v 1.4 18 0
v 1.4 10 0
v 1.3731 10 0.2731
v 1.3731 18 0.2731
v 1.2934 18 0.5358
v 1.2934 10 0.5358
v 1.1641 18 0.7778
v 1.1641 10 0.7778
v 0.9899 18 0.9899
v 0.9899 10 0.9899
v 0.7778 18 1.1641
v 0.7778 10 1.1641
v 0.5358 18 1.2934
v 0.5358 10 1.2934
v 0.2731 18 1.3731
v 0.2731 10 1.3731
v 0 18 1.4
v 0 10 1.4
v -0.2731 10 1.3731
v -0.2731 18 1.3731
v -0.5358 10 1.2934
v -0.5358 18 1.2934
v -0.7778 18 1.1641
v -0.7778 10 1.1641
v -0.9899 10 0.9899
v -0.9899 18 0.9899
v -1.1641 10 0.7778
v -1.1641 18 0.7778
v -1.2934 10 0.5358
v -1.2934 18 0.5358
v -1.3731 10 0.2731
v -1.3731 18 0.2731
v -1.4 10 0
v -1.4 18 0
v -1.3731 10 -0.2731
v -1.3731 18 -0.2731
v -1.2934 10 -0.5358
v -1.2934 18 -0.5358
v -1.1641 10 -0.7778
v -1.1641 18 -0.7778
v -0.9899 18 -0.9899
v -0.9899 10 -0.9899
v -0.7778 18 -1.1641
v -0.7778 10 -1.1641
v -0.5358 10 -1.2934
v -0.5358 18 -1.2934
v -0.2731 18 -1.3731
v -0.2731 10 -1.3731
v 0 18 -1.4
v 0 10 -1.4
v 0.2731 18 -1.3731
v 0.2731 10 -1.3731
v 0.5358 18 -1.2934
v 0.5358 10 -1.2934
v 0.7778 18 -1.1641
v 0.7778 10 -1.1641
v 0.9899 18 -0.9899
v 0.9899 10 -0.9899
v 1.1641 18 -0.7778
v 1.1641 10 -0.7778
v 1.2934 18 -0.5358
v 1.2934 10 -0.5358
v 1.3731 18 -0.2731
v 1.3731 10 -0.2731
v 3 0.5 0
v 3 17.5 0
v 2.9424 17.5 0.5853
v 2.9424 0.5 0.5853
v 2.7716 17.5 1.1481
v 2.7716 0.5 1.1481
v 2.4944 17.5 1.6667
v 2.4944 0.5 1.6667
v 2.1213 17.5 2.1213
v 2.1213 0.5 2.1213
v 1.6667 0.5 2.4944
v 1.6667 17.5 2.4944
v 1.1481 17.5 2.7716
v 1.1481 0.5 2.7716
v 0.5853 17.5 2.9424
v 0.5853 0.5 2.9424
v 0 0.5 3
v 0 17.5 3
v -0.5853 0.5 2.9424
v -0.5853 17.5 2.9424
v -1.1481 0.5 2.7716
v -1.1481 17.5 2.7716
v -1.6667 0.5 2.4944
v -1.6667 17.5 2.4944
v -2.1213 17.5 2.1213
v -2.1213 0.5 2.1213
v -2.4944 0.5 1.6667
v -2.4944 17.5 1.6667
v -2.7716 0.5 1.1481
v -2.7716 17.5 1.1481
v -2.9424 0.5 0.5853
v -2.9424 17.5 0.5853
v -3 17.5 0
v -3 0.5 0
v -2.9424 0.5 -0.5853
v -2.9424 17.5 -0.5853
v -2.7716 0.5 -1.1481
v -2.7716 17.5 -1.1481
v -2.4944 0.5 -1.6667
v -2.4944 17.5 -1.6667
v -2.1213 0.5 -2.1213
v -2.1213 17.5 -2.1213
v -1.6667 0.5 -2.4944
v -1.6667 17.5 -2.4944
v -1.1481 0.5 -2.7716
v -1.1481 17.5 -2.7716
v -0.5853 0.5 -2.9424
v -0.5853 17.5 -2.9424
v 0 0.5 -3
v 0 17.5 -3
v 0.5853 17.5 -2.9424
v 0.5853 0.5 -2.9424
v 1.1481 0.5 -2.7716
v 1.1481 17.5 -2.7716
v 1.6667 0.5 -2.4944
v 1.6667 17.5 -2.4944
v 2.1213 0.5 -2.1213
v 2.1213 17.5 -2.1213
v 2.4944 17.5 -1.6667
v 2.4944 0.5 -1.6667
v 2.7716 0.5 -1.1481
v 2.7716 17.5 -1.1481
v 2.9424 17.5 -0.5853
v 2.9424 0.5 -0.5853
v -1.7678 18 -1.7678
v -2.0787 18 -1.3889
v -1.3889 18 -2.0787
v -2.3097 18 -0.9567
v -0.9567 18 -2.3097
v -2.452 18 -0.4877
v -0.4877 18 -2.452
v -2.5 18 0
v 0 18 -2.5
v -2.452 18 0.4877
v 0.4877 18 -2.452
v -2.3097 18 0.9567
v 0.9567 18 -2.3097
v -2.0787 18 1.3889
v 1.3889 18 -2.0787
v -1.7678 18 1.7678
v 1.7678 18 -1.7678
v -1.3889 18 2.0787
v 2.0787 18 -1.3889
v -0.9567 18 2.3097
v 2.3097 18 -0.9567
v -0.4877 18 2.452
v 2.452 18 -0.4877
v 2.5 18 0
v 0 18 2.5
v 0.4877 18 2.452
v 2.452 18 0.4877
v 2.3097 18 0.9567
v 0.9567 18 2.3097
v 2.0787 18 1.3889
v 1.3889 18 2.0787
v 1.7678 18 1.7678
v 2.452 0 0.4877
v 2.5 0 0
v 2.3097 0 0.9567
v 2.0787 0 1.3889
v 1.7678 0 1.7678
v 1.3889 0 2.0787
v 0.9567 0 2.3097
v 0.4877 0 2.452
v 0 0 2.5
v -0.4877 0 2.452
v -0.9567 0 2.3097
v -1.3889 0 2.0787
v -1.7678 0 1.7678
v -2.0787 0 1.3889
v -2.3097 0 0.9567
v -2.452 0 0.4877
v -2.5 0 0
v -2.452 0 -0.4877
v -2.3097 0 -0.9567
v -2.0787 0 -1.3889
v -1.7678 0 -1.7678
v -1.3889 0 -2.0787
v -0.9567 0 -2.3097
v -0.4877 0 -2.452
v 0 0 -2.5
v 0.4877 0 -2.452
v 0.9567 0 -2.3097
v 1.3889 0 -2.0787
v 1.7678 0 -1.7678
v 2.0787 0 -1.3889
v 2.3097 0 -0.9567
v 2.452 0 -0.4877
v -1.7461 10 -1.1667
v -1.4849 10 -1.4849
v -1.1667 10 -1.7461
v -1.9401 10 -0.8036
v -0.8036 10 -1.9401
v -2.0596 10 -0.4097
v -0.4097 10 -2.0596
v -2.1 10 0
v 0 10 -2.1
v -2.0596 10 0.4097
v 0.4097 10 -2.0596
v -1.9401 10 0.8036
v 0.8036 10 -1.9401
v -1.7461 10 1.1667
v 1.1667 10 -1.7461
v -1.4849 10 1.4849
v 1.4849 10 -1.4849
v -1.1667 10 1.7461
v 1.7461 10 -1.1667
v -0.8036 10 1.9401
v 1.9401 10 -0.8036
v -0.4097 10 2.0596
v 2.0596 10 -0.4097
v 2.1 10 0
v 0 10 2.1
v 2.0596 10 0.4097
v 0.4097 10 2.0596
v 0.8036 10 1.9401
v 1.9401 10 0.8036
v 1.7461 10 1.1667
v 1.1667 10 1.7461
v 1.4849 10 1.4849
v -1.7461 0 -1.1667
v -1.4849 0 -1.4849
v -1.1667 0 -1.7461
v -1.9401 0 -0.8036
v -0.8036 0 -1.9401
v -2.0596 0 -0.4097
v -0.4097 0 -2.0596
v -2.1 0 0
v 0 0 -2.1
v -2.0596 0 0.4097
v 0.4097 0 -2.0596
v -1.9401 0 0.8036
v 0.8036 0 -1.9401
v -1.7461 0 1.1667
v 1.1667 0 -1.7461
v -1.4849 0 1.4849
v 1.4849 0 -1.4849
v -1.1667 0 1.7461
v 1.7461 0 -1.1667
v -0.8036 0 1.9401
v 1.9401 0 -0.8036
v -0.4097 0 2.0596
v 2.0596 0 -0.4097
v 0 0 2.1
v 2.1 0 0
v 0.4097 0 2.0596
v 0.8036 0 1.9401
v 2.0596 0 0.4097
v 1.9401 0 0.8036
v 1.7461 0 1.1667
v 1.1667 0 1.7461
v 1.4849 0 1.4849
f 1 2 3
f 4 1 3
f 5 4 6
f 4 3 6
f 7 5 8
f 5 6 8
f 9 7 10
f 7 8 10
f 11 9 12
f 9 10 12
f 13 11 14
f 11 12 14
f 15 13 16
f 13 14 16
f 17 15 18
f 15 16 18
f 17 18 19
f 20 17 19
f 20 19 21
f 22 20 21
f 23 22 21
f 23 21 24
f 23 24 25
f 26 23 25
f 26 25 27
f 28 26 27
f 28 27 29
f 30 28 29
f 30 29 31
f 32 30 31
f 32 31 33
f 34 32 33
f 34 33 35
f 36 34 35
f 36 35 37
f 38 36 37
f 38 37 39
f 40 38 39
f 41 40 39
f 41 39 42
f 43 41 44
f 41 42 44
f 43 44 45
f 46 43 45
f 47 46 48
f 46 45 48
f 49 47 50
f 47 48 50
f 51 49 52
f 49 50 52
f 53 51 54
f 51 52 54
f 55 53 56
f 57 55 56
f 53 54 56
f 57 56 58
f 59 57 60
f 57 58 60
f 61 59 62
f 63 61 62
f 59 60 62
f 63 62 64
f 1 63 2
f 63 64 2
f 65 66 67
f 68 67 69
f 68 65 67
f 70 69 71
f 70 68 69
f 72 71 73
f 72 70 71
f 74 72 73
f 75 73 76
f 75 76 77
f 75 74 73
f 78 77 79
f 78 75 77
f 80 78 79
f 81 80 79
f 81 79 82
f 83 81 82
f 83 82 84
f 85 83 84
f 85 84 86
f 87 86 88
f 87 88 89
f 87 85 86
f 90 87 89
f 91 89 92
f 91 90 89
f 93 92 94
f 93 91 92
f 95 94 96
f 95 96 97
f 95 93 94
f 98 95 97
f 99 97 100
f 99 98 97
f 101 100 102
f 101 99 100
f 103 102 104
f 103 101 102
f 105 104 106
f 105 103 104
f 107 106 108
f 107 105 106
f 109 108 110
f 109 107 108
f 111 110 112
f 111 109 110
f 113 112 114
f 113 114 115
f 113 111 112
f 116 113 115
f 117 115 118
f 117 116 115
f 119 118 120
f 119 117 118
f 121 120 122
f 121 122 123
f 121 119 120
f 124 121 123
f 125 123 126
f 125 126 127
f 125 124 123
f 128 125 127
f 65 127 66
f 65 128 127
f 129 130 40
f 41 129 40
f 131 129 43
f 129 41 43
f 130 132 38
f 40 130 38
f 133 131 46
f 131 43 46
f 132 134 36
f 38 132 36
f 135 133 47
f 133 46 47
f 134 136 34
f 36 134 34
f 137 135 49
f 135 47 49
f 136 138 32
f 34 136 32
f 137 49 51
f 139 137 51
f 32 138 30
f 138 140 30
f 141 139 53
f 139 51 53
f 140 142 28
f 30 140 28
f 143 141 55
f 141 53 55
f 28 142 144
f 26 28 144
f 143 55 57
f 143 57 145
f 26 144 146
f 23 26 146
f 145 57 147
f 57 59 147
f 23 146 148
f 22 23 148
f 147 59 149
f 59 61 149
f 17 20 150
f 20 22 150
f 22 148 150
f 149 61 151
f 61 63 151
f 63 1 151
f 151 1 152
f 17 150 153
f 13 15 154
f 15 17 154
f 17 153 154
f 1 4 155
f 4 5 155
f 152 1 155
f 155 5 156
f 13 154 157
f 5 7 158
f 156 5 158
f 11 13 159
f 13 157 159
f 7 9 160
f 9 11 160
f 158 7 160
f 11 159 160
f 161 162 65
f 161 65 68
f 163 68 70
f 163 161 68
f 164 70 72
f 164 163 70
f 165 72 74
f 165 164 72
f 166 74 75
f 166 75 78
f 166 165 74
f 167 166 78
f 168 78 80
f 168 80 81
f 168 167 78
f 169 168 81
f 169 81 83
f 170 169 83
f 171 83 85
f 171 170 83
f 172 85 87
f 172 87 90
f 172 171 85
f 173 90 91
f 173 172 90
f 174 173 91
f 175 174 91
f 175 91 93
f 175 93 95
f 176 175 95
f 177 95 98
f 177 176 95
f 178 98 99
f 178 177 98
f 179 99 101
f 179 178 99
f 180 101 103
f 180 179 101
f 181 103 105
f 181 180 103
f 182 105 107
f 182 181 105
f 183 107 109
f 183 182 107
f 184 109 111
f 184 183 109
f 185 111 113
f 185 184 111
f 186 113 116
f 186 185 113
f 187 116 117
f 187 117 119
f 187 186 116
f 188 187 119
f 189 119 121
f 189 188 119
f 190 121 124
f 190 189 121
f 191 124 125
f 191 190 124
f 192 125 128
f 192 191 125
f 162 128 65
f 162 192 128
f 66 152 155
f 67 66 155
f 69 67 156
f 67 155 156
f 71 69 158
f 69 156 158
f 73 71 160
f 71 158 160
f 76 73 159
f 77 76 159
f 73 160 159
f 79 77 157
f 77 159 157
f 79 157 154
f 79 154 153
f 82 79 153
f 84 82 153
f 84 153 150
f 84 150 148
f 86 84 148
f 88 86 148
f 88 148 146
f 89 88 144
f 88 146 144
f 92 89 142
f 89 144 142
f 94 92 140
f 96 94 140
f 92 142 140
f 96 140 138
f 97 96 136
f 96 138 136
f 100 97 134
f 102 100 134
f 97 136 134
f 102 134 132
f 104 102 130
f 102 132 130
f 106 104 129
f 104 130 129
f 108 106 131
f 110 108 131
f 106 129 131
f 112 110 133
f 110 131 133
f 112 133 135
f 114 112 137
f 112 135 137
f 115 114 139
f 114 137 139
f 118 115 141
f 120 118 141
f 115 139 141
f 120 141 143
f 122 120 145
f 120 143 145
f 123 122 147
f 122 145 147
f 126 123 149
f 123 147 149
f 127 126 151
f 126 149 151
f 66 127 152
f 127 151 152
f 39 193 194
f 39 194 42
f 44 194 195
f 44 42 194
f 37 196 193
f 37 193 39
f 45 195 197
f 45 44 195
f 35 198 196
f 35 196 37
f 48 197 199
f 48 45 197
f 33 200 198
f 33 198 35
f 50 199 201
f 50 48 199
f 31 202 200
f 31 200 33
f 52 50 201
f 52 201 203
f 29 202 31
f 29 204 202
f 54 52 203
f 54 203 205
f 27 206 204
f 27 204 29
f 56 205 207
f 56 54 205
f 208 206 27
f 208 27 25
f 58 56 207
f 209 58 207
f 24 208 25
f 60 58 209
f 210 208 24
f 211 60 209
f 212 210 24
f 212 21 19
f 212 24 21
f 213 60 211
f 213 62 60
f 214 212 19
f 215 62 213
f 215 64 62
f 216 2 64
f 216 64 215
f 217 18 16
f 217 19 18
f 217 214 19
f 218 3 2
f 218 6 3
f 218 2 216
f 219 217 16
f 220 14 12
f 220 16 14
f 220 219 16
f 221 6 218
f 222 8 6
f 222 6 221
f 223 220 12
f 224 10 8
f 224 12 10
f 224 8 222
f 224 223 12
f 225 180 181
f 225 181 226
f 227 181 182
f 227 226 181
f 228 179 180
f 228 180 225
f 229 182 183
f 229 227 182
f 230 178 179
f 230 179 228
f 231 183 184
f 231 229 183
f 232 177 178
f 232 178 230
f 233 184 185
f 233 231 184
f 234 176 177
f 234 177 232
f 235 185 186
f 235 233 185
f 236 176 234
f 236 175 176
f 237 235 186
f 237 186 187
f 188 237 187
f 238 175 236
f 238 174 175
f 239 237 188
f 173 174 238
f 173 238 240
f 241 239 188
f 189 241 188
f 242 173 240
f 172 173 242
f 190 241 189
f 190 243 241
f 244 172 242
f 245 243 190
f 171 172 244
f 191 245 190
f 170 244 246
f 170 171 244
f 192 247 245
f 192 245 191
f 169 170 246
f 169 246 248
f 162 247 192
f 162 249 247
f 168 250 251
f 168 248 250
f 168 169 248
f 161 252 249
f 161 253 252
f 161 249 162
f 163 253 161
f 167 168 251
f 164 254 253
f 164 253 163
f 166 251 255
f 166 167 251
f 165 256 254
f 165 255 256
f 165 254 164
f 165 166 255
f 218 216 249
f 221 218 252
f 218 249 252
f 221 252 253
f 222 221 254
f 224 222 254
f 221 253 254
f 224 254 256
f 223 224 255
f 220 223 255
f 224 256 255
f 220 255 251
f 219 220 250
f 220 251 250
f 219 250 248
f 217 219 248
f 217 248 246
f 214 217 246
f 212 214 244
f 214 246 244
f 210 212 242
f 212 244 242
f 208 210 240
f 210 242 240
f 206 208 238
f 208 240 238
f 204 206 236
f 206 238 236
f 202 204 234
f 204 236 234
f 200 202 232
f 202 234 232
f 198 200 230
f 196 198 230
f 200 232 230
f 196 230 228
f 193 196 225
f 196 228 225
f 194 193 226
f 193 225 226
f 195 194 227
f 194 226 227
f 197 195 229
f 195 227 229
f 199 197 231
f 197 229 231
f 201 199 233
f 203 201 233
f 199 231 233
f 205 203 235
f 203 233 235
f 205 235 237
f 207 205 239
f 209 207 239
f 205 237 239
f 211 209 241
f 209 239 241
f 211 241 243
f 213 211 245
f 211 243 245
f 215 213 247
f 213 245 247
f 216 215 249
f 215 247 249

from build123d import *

# Parameters (mm, degrees)
F0_R     = 3
F1_DEPTH = 18
F2_R     = 2.1
F3_DEPTH = 10
F4_R     = 1.4
F5_DEPTH = 18.001
F6_SIZE  = 0.5
F7_SIZE  = 0.5


with BuildPart() as f1:
    # F0 (on Front) → F1 (new body)
    with BuildSketch(Plane.XZ):
        Circle(F0_R)
    extrude(amount=-F1_DEPTH)

    # F2 (on face) → F3 (cut)
    with BuildSketch(Plane.XZ):
        Circle(F2_R)
    extrude(amount=-F3_DEPTH, mode=Mode.SUBTRACT)

    # F4 (on Front) → F5 (cut, through all)
    with BuildSketch(Plane.XZ):
        Circle(F4_R)
    extrude(amount=-F5_DEPTH, mode=Mode.SUBTRACT)

    # F6
    f6_edges = [f1.edges().sort_by_distance(p)[0] for p in [
        (-3, 0, 0),
    ]]
    chamfer(f6_edges, length=F6_SIZE)

    # F7
    f7_edges = [f1.edges().sort_by_distance(p)[0] for p in [
        (-3, 18, 0),
    ]]
    chamfer(f7_edges, length=F7_SIZE)


solid = f1.part
